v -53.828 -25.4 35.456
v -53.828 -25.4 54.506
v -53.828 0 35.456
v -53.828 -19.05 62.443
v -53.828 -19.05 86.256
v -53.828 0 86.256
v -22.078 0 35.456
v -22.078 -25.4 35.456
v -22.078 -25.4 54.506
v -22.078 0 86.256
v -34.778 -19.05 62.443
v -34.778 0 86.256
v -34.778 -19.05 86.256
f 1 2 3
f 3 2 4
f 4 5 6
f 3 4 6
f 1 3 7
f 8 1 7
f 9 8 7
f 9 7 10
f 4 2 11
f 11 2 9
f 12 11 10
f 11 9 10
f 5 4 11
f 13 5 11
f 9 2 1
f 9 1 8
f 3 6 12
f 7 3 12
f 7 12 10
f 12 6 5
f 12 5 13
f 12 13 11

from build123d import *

# Parameters (mm, degrees)
F0_W     = 31.75
F0_H     = 50.8
F1_DEPTH = 25.4
F4_DEPTH = 31.751
F2_W     = 19.05
F2_H     = 19.05
F5_DEPTH = 50.546


with BuildPart() as f1:
    # F0 (on Front) → F1 (new body)
    with BuildSketch(Plane.XZ):
        with Locations((-37.953461, 60.855525)):
            Rectangle(F0_W, F0_H)
    extrude(amount=F1_DEPTH)

    # F3 (on face) → F4 (cut, through all)
    with BuildSketch(Plane.YZ.offset(-22.078461)):
        Polygon((-25.4, 54.505525), (0, 86.255525), (-25.4, 86.255525), align=None)
    extrude(amount=-F4_DEPTH, mode=Mode.SUBTRACT)

    # F2 (on face) → F5 (join)
    with BuildSketch(Plane.XY.offset(86.255525)):
        with Locations((-44.303461, -9.525)):
            Rectangle(F2_W, F2_H)
    extrude(amount=-F5_DEPTH)


solid = f1.part
